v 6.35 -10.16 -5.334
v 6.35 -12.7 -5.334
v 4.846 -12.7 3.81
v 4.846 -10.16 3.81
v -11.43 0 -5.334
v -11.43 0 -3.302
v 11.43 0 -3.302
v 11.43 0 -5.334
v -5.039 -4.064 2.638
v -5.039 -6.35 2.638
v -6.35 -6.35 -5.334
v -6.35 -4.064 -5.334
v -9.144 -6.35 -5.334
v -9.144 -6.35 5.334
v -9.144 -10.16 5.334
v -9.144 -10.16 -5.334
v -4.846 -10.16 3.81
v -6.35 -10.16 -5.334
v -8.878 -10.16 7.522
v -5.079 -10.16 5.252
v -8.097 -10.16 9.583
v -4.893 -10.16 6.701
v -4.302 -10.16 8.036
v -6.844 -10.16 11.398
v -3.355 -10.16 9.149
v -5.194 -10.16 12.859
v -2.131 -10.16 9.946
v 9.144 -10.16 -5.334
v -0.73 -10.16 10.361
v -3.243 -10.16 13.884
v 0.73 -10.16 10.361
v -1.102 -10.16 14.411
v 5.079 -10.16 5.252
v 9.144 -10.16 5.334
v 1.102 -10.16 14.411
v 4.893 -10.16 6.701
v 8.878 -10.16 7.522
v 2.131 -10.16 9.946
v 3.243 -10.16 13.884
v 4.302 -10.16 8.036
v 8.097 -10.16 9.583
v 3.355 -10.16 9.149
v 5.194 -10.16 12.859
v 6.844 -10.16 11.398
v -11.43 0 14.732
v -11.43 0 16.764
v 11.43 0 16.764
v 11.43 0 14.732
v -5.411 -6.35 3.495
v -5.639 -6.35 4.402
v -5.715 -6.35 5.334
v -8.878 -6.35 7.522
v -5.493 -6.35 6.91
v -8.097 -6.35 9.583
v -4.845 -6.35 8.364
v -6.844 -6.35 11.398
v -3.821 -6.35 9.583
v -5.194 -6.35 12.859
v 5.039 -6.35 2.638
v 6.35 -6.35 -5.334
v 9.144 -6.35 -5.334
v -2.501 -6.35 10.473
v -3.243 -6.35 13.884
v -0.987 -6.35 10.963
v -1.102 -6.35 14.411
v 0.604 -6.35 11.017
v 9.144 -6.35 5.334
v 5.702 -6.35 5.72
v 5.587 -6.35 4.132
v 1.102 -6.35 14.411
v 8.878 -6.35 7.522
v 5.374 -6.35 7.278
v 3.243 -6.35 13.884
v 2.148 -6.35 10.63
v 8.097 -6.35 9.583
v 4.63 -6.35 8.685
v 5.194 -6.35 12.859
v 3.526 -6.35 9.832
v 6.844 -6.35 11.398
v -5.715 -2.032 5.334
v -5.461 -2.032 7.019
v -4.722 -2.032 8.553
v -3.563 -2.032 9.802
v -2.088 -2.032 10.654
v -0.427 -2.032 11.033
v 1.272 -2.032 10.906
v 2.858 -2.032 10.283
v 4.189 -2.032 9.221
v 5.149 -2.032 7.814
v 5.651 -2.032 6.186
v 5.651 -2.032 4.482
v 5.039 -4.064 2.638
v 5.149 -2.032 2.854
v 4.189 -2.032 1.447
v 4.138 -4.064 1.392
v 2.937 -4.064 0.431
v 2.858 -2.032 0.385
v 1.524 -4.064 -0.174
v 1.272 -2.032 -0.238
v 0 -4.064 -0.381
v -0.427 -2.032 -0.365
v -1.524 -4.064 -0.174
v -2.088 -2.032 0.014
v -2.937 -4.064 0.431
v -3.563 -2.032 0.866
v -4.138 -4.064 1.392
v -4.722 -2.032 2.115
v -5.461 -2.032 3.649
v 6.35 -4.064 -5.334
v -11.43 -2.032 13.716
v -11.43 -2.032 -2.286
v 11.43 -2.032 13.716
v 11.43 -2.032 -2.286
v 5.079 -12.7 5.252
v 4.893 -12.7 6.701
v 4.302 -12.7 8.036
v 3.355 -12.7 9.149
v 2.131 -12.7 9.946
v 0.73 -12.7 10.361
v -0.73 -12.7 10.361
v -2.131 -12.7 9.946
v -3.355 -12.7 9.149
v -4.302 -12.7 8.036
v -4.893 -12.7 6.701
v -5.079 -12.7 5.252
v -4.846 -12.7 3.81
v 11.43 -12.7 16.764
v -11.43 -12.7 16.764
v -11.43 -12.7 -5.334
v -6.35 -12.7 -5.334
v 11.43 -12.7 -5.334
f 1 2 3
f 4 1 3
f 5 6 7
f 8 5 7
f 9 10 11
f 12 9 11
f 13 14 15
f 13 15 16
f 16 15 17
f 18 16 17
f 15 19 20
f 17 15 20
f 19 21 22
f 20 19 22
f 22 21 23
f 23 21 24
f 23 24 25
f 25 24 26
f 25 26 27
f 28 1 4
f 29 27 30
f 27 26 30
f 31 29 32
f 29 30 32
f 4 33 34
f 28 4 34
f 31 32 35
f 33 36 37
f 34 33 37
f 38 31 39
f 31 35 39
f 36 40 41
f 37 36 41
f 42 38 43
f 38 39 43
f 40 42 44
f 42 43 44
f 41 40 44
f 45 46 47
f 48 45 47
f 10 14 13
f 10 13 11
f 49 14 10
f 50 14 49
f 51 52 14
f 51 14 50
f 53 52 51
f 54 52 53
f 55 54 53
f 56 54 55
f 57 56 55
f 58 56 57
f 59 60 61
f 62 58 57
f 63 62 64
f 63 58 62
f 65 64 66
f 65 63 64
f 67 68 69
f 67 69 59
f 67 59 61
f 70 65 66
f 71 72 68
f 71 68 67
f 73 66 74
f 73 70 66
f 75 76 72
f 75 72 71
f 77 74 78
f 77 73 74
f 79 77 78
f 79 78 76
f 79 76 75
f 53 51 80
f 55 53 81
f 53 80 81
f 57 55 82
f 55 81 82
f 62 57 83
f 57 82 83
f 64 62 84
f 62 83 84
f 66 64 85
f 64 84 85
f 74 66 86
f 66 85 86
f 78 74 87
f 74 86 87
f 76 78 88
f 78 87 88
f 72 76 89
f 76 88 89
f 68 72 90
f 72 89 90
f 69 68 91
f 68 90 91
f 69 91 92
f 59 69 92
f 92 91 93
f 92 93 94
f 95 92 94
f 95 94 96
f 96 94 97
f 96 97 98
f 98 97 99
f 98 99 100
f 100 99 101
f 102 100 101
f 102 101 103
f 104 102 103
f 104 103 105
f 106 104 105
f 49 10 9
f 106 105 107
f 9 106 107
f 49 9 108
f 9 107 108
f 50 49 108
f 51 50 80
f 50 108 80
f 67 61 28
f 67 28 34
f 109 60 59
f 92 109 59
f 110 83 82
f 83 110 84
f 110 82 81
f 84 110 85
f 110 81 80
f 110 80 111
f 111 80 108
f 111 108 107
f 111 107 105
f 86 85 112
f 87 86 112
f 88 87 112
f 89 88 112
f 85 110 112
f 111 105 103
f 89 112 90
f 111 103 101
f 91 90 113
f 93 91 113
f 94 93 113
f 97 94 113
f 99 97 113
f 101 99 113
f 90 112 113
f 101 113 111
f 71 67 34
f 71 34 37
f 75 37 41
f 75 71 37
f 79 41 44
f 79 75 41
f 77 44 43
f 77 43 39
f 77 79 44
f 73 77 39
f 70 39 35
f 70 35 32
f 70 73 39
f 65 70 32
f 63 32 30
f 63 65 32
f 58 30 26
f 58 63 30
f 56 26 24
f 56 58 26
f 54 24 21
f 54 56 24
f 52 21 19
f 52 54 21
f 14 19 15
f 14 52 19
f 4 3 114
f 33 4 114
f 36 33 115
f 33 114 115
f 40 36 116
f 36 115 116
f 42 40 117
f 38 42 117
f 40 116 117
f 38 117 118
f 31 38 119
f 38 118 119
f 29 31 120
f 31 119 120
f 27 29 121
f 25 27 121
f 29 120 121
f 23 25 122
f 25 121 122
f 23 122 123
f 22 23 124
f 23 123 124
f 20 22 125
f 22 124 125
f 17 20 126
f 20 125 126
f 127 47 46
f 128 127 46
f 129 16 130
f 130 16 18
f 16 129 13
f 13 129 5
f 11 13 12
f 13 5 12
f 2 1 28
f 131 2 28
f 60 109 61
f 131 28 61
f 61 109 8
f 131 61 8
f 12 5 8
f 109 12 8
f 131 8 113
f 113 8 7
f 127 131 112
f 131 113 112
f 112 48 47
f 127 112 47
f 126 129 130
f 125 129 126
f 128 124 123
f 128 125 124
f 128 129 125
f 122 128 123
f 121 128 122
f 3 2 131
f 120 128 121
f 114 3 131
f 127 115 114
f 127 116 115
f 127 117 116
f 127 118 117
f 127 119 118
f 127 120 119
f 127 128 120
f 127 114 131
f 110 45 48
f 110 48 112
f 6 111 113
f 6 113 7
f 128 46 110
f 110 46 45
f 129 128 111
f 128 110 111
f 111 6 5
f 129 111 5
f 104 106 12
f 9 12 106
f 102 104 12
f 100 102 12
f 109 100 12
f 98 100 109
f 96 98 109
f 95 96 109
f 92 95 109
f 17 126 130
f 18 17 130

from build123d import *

# Parameters (mm, degrees)
F1_DEPTH  = 12.7
F4_DEPTH  = 3.81
F6_DEPTH  = 8.636
F8_DEPTH  = 25.4
F9_R      = 5.715
F10_DEPTH = 4.318


with BuildPart() as f1:
    # F0 (on Front) → F1 (new body)
    with BuildSketch(Plane.XZ):
        Polygon((-11.43, -5.334), (11.43, -5.334), (11.43, 5.334), (11.43, 16.764), (-11.43, 16.764), (-11.43, 5.334), align=None)
    extrude(amount=F1_DEPTH)

    # F3 (on offset) → F4 (cut)
    with BuildSketch(Plane.XZ.offset(6.35)):
        with BuildLine():
            Line((-9.144, -5.334), (9.144, -5.334))
            Line((9.144, -5.334), (9.144, 5.334))
            ThreePointArc((9.144, 5.334), (0, 14.478), (-9.144, 5.334))
            Line((-9.144, 5.334), (-9.144, -5.334))
        make_face()
    extrude(amount=F4_DEPTH, mode=Mode.SUBTRACT)

    # F5 (on face) → F6 (cut)
    with BuildSketch(Plane.XZ.offset(12.7)):
        with BuildLine():
            Line((6.35, -5.334), (4.846011, 3.81))
            ThreePointArc((4.846011, 3.81), (0, 10.414), (-4.846011, 3.81))
            Line((-4.846011, 3.81), (-6.35, -5.334))
            Line((-6.35, -5.334), (6.35, -5.334))
        make_face()
    extrude(amount=-F6_DEPTH, mode=Mode.SUBTRACT)

    # F7 (on face) → F8 (cut)
    with BuildSketch(Plane.YZ.offset(11.43)):
        Polygon((-2.032, -2.286), (0, -3.302), (0, 14.732), (-2.032, 13.716), align=None)
    extrude(amount=-F8_DEPTH, mode=Mode.SUBTRACT)

    # F9 (on face) → F10 (cut, through all)
    with BuildSketch(Plane(origin=(0, -2.032, 0), x_dir=(-1, 0, 0), z_dir=(0, 1, 0))):
        with Locations((0, 5.334)):
            Circle(F9_R)
    extrude(amount=-F10_DEPTH, mode=Mode.SUBTRACT)


solid = f1.part
